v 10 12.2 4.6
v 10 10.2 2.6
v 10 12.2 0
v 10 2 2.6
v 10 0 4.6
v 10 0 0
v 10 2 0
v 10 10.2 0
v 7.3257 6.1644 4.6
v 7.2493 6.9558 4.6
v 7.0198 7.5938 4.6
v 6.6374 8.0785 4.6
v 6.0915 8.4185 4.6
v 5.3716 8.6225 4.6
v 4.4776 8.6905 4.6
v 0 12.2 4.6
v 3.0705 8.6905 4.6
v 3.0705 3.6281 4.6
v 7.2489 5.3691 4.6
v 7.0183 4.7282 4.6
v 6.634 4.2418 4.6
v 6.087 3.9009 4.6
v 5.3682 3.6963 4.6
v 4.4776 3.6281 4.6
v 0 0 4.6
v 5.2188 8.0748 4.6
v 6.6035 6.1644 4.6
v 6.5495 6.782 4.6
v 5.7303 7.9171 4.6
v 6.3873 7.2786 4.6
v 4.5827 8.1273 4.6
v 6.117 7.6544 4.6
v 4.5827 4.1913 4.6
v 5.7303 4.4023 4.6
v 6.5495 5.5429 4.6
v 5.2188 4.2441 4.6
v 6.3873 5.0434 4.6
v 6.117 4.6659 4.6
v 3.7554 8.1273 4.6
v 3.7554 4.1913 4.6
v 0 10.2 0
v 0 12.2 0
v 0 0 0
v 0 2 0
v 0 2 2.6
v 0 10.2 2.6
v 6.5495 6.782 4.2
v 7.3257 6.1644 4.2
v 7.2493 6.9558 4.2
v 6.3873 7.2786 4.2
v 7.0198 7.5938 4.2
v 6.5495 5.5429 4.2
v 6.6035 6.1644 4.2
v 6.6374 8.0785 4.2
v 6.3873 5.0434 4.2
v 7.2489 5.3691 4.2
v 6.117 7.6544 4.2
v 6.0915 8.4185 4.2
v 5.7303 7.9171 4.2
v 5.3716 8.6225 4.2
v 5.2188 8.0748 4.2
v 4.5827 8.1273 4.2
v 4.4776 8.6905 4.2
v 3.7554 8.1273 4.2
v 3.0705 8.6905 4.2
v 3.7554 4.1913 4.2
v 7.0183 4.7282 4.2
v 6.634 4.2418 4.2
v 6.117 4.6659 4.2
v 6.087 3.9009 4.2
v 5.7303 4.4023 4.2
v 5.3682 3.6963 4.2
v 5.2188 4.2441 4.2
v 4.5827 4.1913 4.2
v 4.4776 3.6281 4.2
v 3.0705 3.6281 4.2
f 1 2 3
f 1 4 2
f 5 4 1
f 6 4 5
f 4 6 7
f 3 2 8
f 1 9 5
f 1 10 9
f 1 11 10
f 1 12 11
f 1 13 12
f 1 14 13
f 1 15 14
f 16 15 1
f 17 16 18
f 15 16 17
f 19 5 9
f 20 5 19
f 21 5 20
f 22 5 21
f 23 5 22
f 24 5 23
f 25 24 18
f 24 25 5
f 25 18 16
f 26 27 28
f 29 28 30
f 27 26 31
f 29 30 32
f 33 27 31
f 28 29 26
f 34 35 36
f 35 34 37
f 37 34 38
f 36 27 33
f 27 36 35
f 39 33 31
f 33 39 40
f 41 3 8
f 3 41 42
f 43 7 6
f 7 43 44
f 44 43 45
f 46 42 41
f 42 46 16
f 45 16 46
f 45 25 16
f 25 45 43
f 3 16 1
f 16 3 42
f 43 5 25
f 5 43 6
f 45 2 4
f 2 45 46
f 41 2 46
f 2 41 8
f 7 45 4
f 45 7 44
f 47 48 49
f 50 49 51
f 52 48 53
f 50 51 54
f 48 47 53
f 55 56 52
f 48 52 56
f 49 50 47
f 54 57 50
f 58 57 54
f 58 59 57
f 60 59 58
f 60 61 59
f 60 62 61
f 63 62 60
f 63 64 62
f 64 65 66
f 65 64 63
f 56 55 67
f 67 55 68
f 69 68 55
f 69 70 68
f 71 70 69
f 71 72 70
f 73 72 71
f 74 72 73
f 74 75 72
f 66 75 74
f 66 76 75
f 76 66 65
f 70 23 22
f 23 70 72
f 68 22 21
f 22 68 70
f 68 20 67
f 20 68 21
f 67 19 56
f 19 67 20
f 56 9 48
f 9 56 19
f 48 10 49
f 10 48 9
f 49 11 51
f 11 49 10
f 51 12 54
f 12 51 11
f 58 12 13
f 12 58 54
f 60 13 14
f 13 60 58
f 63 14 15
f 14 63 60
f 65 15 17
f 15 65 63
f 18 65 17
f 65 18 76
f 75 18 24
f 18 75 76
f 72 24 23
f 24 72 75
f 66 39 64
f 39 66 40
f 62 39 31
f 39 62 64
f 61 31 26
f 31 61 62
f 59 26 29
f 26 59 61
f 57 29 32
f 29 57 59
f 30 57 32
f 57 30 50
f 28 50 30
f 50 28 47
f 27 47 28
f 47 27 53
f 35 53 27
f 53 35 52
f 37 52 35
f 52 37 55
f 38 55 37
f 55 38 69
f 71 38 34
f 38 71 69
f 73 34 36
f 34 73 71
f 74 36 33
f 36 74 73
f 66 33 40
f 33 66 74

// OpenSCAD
// Adjustments to Flight Instruments to allow multi-colour printing
// Based on CaptainBobSim's Cessna 172 project
//
// Add markings to be printed directly
//
// William Minchin -- 2025-12-21 -- Print 0131C

// brace for the arm near the bottom

FILE_ROOT = "D:/Code/The-Cessna-172-Project-V3/Section 2 - Component Library and Structure/2-5 Instruments/6-PACK_Attitude Indicator/V2 STLs";
// Print the text this deep (to avoid back bleed)
text_depth = 1; // in mm
// How wide should the marking lines be?
line_width = 1.5; // A - 1; B - 1.5
// Serial number for this print version
serial = "0131-03A";
// Serial for arm support only
// serial = "0131-04B";


OVERSIZE_FUDGE_FACTOR = 2;

// measured
outer_arm_width = 68.24;  // mm
// measured
arm_length = 42;  // mm

magnet_d = 6.2;  // Gridfinity, Print 0061E
magnet_depth = 2.3;

y_back_of_display = 13; // mm

font_face = "Aldo";
font_size = 5;
// should be multiple of layer height
deboss_depth = 1;
fudge = 0.01;


// my_d = altitude_indicator_outer_ring_d + OVERSIZE_FUDGE_FACTOR;
// mid_disk = (altitude_indicator_inner_ring_d + altitude_indicator_outer_ring_d) / 2;
// ring_width = (altitude_indicator_outer_ring_d - altitude_indicator_inner_ring_d) / 2;

module pitch_arm_base() {
    // rotate([0, 0, 0]) 
    // translate([0, 0, 0])
    import(str(FILE_ROOT, "/", "Pitch Arm (Doohicky).stl"));
}

module clipped_base() {
    _serial = serial;

    difference() {
        pitch_arm_base();

        // magnet hole
        translate([-outer_arm_width / 2 - 2.7, 22.3, 0])
        rotate([0, 90, 0])
        cylinder(d = magnet_d, h = magnet_depth + 5, $fn=24);

        intersection() {
            // not clipped, or you hit recursion
            mark_lines();

            // clip to front of display
            translate([-50, y_back_of_display - 30, -50])
            cube([100, 30, 100]); 
        }

        // part label
        translate([outer_arm_width / 2 - deboss_depth, 27, 0])
        rotate([90, 0, 90])
        linear_extrude(deboss_depth + fudge)
        text(
            _serial,
            size = font_size,
            font = font_face,
            halign = "center",
            valign = "center"
        );
    }
}


module mark_lines() {
    y_center = 6.25;
    face_font_size = 3;  // in mm
    // face_font_face = "B612:style=Regular";
    face_font_face = "B612:style=Bold";

    small_line_width = line_width * 2/3;

    color("snow") {

    // horizon line
    translate([-outer_arm_width / 2, y_center, -line_width / 2])
    cube([outer_arm_width, line_width, text_depth + fudge]);

    // ground forward lines
    translate([0, y_center, 0])
    for (rot = [
        -70,
        -35,
        35,
        70,
    ]) {
        rotate([0, rot, 0])
        translate([-small_line_width/2, 0, -30 + 1.2 - 0.039 * abs(rot)])
        cube([
            small_line_width,
            // text_depth,
            7,
            30
        ]);
    }


    // pitch up lines
    center_width_plus = 8;
    edge_width_plus = outer_arm_width - center_width_plus - 2 * 6;
    text_width_plus = 7;
    translate([0, arm_length + 2, 0])
    for (rot = [
        10,
        20,
    ]) {
        rotate([180 - rot, 0, 0]) {
            // translate([-center_width_plus / 2 - edge_width_plus - text_width_plus, 0, -line_width/2])
            // cube([edge_width_10, arm_length, line_width]);

            translate([-center_width_plus / 2 - text_width_plus / 2, arm_length - 10, 0])
            rotate([270, 0, 0])
            linear_extrude(10)
            text(
                str(rot),
                size = face_font_size,
                font = face_font_face,
                halign = "center",
                valign = "center"
            );

            translate([-center_width_plus / 2, 0, -line_width/2])
            cube([center_width_plus, arm_length, line_width]);

            translate([center_width_plus / 2 + text_width_plus / 2, arm_length - 10, 0])
            rotate([270, 0, 0])
            linear_extrude(10)
            text(
                str(rot),
                size = face_font_size,
                font = face_font_face,
                halign = "center",
                valign = "center"
            );

            // translate([center_width_plus / 2 + text_width_plus, 0, -line_width/2])
            // cube([edge_width_plus, arm_length, line_width]);
        }
    }

    // 10 degrees pitch down
    center_width_10 = 12;
    edge_width_10 = outer_arm_width - center_width_10 - 2 * 6;
    text_width_10 = 7;
    translate([0, arm_length + 2, 0])
    rotate([180 + 10, 0, 0]) {
        translate([-center_width_10 / 2 - edge_width_10 - text_width_10, 0, -line_width/2])
        cube([edge_width_10, arm_length, line_width]);

        translate([-center_width_10 / 2 - text_width_10 / 2, arm_length - 10, 0])
        rotate([270, 0, 0])
        linear_extrude(10)
        text(
            "10",
            size = face_font_size,
            font = face_font_face,
            halign = "center",
            valign = "center"
        );

        translate([-center_width_10 / 2, 0, -line_width/2])
        cube([center_width_10, arm_length, line_width]);

        translate([center_width_10 / 2 + text_width_10 / 2, arm_length - 10, 0])
        rotate([270, 0, 0])
        linear_extrude(10)
        text(
            "10",
            size = face_font_size,
            font = face_font_face,
            halign = "center",
            valign = "center"
        );

        translate([center_width_10 / 2 + text_width_10, 0, -line_width/2])
        cube([edge_width_10, arm_length, line_width]);
    }

    // 20 degrees pitch down
    center_width_20 = 21;
    edge_width_20 = outer_arm_width - center_width_20 - 2 * 6;
    text_width_20 = 7;
    translate([0, arm_length + 2, 0])
    rotate([180 + 20, 0, 0]) {
        translate([-center_width_20 / 2 - edge_width_20 - text_width_20, 0, -line_width/2])
        cube([edge_width_20, arm_length, line_width]);

        translate([-center_width_20 / 2 - text_width_20 / 2, arm_length - 10, 0])
        rotate([270, 0, 0])
        linear_extrude(10)
        text(
            "20",
            size = face_font_size,
            font = face_font_face,
            halign = "center",
            valign = "center"
        );

        translate([-center_width_20 / 2, 0, -line_width/2])
        cube([center_width_20, arm_length, line_width]);

        translate([center_width_20 / 2 + text_width_20 / 2, arm_length - 10, 0])
        rotate([270, 0, 0])
        linear_extrude(10)
        text(
            "20",
            size = face_font_size,
            font = face_font_face,
            halign = "center",
            valign = "center"
        );

        translate([center_width_20 / 2 + text_width_20, 0, -line_width/2])
        cube([edge_width_20, arm_length, line_width]);
    }


    // small lines at inbetween pitches
    center_width_small = 4;
    translate([0, arm_length + 2, 0])
    for (rot = [
        25,
        15,
        5,
        -5,
        -15,
        -25,
    ]) {
        rotate([180 - rot, 0, 0]) {
            translate([-center_width_small / 2, 0, -small_line_width/2])
            cube([center_width_small, arm_length, small_line_width]);
        }
    }
}
}

module clipped_mark_lines() {
    color("snow")
    difference() {
        intersection() {
            mark_lines();
            pitch_arm_base();
        }

        translate([-50, y_back_of_display, -50])
        cube([100, 100, 100]); 
    }       
}


module sky_base_front() {
    color("skyblue")
    difference() {
        intersection() {
            clipped_base();

            translate([-50, 0, 0]) 
            cube([100, 100, 100]);
        }

        translate([-50, y_back_of_display, -50])
        cube([100, 100, 100]); 
    }
}

module earth_base_front() {
    color("SaddleBrown")
    difference() {
        intersection() {
            clipped_base();

            translate([-50, 0, -100]) 
            cube([100, 100, 100]);
        }

        translate([-50, y_back_of_display, -50])
        cube([100, 100, 100]); 
    }
}

module sky_base_arm() {
    color("green")
    intersection() {
        intersection() {
            clipped_base();

            translate([-50, 0, 0]) 
            cube([100, 100, 100]);
        }

        translate([-50, y_back_of_display, -50])
        cube([100, 100, 100]); 
    }
}

module earth_base_arm() {
    color("orange")
    intersection() {
        intersection() {
            clipped_base();
            // pitch_arm_base();

            translate([-50, 0, -100]) 
            cube([100, 100, 100]);
        }

        translate([-50, y_back_of_display, -50])
        cube([100, 100, 100]); 
    }
}


// ---------------------------------
// brace for arm (if they break after printing)

pitch_arm_width = 8;
pitch_arm_thickness = 2.5;
brace_length = 10;
brace_wall_thickness = 2;
brace_inner_gap = 0.1;
brace_serial = "D";  //  0131-07

module base_brace(my_length) {
    difference() {
        cube([
            my_length,
            pitch_arm_width + 2 * brace_wall_thickness + 2 * brace_inner_gap,
            pitch_arm_thickness + brace_wall_thickness + brace_inner_gap
        ]);

        translate([-fudge, brace_wall_thickness, -fudge]) 
        cube([
            my_length + 2 * fudge,
            pitch_arm_width + 2 * brace_inner_gap,
            pitch_arm_thickness + brace_inner_gap + fudge
        ]);

        #translate([
            my_length / 2,
            (pitch_arm_width + 2 * brace_wall_thickness + 2 * brace_inner_gap) / 2,
            pitch_arm_thickness + brace_wall_thickness + brace_inner_gap - 0.4
        ]) 
        linear_extrude(0.4 + fudge)
        text(
            brace_serial,
            size = font_size,
            font = font_face,
            halign = "center",
            valign = "center"
        );
    }
}

module short_brace() {
    brace_length = 10;
    base_brace(my_length = brace_length);
}

module long_brace() {
    brace_length = 25;
    base_brace(my_length = brace_length);
}


// ---------------------------------


// clipped_base();
// mark_lines();

// // color("yellow")
// clipped_mark_lines();

// sky_base_front();
// earth_base_front();
// sky_base_arm();
// earth_base_arm();


short_brace();
// long_brace();
